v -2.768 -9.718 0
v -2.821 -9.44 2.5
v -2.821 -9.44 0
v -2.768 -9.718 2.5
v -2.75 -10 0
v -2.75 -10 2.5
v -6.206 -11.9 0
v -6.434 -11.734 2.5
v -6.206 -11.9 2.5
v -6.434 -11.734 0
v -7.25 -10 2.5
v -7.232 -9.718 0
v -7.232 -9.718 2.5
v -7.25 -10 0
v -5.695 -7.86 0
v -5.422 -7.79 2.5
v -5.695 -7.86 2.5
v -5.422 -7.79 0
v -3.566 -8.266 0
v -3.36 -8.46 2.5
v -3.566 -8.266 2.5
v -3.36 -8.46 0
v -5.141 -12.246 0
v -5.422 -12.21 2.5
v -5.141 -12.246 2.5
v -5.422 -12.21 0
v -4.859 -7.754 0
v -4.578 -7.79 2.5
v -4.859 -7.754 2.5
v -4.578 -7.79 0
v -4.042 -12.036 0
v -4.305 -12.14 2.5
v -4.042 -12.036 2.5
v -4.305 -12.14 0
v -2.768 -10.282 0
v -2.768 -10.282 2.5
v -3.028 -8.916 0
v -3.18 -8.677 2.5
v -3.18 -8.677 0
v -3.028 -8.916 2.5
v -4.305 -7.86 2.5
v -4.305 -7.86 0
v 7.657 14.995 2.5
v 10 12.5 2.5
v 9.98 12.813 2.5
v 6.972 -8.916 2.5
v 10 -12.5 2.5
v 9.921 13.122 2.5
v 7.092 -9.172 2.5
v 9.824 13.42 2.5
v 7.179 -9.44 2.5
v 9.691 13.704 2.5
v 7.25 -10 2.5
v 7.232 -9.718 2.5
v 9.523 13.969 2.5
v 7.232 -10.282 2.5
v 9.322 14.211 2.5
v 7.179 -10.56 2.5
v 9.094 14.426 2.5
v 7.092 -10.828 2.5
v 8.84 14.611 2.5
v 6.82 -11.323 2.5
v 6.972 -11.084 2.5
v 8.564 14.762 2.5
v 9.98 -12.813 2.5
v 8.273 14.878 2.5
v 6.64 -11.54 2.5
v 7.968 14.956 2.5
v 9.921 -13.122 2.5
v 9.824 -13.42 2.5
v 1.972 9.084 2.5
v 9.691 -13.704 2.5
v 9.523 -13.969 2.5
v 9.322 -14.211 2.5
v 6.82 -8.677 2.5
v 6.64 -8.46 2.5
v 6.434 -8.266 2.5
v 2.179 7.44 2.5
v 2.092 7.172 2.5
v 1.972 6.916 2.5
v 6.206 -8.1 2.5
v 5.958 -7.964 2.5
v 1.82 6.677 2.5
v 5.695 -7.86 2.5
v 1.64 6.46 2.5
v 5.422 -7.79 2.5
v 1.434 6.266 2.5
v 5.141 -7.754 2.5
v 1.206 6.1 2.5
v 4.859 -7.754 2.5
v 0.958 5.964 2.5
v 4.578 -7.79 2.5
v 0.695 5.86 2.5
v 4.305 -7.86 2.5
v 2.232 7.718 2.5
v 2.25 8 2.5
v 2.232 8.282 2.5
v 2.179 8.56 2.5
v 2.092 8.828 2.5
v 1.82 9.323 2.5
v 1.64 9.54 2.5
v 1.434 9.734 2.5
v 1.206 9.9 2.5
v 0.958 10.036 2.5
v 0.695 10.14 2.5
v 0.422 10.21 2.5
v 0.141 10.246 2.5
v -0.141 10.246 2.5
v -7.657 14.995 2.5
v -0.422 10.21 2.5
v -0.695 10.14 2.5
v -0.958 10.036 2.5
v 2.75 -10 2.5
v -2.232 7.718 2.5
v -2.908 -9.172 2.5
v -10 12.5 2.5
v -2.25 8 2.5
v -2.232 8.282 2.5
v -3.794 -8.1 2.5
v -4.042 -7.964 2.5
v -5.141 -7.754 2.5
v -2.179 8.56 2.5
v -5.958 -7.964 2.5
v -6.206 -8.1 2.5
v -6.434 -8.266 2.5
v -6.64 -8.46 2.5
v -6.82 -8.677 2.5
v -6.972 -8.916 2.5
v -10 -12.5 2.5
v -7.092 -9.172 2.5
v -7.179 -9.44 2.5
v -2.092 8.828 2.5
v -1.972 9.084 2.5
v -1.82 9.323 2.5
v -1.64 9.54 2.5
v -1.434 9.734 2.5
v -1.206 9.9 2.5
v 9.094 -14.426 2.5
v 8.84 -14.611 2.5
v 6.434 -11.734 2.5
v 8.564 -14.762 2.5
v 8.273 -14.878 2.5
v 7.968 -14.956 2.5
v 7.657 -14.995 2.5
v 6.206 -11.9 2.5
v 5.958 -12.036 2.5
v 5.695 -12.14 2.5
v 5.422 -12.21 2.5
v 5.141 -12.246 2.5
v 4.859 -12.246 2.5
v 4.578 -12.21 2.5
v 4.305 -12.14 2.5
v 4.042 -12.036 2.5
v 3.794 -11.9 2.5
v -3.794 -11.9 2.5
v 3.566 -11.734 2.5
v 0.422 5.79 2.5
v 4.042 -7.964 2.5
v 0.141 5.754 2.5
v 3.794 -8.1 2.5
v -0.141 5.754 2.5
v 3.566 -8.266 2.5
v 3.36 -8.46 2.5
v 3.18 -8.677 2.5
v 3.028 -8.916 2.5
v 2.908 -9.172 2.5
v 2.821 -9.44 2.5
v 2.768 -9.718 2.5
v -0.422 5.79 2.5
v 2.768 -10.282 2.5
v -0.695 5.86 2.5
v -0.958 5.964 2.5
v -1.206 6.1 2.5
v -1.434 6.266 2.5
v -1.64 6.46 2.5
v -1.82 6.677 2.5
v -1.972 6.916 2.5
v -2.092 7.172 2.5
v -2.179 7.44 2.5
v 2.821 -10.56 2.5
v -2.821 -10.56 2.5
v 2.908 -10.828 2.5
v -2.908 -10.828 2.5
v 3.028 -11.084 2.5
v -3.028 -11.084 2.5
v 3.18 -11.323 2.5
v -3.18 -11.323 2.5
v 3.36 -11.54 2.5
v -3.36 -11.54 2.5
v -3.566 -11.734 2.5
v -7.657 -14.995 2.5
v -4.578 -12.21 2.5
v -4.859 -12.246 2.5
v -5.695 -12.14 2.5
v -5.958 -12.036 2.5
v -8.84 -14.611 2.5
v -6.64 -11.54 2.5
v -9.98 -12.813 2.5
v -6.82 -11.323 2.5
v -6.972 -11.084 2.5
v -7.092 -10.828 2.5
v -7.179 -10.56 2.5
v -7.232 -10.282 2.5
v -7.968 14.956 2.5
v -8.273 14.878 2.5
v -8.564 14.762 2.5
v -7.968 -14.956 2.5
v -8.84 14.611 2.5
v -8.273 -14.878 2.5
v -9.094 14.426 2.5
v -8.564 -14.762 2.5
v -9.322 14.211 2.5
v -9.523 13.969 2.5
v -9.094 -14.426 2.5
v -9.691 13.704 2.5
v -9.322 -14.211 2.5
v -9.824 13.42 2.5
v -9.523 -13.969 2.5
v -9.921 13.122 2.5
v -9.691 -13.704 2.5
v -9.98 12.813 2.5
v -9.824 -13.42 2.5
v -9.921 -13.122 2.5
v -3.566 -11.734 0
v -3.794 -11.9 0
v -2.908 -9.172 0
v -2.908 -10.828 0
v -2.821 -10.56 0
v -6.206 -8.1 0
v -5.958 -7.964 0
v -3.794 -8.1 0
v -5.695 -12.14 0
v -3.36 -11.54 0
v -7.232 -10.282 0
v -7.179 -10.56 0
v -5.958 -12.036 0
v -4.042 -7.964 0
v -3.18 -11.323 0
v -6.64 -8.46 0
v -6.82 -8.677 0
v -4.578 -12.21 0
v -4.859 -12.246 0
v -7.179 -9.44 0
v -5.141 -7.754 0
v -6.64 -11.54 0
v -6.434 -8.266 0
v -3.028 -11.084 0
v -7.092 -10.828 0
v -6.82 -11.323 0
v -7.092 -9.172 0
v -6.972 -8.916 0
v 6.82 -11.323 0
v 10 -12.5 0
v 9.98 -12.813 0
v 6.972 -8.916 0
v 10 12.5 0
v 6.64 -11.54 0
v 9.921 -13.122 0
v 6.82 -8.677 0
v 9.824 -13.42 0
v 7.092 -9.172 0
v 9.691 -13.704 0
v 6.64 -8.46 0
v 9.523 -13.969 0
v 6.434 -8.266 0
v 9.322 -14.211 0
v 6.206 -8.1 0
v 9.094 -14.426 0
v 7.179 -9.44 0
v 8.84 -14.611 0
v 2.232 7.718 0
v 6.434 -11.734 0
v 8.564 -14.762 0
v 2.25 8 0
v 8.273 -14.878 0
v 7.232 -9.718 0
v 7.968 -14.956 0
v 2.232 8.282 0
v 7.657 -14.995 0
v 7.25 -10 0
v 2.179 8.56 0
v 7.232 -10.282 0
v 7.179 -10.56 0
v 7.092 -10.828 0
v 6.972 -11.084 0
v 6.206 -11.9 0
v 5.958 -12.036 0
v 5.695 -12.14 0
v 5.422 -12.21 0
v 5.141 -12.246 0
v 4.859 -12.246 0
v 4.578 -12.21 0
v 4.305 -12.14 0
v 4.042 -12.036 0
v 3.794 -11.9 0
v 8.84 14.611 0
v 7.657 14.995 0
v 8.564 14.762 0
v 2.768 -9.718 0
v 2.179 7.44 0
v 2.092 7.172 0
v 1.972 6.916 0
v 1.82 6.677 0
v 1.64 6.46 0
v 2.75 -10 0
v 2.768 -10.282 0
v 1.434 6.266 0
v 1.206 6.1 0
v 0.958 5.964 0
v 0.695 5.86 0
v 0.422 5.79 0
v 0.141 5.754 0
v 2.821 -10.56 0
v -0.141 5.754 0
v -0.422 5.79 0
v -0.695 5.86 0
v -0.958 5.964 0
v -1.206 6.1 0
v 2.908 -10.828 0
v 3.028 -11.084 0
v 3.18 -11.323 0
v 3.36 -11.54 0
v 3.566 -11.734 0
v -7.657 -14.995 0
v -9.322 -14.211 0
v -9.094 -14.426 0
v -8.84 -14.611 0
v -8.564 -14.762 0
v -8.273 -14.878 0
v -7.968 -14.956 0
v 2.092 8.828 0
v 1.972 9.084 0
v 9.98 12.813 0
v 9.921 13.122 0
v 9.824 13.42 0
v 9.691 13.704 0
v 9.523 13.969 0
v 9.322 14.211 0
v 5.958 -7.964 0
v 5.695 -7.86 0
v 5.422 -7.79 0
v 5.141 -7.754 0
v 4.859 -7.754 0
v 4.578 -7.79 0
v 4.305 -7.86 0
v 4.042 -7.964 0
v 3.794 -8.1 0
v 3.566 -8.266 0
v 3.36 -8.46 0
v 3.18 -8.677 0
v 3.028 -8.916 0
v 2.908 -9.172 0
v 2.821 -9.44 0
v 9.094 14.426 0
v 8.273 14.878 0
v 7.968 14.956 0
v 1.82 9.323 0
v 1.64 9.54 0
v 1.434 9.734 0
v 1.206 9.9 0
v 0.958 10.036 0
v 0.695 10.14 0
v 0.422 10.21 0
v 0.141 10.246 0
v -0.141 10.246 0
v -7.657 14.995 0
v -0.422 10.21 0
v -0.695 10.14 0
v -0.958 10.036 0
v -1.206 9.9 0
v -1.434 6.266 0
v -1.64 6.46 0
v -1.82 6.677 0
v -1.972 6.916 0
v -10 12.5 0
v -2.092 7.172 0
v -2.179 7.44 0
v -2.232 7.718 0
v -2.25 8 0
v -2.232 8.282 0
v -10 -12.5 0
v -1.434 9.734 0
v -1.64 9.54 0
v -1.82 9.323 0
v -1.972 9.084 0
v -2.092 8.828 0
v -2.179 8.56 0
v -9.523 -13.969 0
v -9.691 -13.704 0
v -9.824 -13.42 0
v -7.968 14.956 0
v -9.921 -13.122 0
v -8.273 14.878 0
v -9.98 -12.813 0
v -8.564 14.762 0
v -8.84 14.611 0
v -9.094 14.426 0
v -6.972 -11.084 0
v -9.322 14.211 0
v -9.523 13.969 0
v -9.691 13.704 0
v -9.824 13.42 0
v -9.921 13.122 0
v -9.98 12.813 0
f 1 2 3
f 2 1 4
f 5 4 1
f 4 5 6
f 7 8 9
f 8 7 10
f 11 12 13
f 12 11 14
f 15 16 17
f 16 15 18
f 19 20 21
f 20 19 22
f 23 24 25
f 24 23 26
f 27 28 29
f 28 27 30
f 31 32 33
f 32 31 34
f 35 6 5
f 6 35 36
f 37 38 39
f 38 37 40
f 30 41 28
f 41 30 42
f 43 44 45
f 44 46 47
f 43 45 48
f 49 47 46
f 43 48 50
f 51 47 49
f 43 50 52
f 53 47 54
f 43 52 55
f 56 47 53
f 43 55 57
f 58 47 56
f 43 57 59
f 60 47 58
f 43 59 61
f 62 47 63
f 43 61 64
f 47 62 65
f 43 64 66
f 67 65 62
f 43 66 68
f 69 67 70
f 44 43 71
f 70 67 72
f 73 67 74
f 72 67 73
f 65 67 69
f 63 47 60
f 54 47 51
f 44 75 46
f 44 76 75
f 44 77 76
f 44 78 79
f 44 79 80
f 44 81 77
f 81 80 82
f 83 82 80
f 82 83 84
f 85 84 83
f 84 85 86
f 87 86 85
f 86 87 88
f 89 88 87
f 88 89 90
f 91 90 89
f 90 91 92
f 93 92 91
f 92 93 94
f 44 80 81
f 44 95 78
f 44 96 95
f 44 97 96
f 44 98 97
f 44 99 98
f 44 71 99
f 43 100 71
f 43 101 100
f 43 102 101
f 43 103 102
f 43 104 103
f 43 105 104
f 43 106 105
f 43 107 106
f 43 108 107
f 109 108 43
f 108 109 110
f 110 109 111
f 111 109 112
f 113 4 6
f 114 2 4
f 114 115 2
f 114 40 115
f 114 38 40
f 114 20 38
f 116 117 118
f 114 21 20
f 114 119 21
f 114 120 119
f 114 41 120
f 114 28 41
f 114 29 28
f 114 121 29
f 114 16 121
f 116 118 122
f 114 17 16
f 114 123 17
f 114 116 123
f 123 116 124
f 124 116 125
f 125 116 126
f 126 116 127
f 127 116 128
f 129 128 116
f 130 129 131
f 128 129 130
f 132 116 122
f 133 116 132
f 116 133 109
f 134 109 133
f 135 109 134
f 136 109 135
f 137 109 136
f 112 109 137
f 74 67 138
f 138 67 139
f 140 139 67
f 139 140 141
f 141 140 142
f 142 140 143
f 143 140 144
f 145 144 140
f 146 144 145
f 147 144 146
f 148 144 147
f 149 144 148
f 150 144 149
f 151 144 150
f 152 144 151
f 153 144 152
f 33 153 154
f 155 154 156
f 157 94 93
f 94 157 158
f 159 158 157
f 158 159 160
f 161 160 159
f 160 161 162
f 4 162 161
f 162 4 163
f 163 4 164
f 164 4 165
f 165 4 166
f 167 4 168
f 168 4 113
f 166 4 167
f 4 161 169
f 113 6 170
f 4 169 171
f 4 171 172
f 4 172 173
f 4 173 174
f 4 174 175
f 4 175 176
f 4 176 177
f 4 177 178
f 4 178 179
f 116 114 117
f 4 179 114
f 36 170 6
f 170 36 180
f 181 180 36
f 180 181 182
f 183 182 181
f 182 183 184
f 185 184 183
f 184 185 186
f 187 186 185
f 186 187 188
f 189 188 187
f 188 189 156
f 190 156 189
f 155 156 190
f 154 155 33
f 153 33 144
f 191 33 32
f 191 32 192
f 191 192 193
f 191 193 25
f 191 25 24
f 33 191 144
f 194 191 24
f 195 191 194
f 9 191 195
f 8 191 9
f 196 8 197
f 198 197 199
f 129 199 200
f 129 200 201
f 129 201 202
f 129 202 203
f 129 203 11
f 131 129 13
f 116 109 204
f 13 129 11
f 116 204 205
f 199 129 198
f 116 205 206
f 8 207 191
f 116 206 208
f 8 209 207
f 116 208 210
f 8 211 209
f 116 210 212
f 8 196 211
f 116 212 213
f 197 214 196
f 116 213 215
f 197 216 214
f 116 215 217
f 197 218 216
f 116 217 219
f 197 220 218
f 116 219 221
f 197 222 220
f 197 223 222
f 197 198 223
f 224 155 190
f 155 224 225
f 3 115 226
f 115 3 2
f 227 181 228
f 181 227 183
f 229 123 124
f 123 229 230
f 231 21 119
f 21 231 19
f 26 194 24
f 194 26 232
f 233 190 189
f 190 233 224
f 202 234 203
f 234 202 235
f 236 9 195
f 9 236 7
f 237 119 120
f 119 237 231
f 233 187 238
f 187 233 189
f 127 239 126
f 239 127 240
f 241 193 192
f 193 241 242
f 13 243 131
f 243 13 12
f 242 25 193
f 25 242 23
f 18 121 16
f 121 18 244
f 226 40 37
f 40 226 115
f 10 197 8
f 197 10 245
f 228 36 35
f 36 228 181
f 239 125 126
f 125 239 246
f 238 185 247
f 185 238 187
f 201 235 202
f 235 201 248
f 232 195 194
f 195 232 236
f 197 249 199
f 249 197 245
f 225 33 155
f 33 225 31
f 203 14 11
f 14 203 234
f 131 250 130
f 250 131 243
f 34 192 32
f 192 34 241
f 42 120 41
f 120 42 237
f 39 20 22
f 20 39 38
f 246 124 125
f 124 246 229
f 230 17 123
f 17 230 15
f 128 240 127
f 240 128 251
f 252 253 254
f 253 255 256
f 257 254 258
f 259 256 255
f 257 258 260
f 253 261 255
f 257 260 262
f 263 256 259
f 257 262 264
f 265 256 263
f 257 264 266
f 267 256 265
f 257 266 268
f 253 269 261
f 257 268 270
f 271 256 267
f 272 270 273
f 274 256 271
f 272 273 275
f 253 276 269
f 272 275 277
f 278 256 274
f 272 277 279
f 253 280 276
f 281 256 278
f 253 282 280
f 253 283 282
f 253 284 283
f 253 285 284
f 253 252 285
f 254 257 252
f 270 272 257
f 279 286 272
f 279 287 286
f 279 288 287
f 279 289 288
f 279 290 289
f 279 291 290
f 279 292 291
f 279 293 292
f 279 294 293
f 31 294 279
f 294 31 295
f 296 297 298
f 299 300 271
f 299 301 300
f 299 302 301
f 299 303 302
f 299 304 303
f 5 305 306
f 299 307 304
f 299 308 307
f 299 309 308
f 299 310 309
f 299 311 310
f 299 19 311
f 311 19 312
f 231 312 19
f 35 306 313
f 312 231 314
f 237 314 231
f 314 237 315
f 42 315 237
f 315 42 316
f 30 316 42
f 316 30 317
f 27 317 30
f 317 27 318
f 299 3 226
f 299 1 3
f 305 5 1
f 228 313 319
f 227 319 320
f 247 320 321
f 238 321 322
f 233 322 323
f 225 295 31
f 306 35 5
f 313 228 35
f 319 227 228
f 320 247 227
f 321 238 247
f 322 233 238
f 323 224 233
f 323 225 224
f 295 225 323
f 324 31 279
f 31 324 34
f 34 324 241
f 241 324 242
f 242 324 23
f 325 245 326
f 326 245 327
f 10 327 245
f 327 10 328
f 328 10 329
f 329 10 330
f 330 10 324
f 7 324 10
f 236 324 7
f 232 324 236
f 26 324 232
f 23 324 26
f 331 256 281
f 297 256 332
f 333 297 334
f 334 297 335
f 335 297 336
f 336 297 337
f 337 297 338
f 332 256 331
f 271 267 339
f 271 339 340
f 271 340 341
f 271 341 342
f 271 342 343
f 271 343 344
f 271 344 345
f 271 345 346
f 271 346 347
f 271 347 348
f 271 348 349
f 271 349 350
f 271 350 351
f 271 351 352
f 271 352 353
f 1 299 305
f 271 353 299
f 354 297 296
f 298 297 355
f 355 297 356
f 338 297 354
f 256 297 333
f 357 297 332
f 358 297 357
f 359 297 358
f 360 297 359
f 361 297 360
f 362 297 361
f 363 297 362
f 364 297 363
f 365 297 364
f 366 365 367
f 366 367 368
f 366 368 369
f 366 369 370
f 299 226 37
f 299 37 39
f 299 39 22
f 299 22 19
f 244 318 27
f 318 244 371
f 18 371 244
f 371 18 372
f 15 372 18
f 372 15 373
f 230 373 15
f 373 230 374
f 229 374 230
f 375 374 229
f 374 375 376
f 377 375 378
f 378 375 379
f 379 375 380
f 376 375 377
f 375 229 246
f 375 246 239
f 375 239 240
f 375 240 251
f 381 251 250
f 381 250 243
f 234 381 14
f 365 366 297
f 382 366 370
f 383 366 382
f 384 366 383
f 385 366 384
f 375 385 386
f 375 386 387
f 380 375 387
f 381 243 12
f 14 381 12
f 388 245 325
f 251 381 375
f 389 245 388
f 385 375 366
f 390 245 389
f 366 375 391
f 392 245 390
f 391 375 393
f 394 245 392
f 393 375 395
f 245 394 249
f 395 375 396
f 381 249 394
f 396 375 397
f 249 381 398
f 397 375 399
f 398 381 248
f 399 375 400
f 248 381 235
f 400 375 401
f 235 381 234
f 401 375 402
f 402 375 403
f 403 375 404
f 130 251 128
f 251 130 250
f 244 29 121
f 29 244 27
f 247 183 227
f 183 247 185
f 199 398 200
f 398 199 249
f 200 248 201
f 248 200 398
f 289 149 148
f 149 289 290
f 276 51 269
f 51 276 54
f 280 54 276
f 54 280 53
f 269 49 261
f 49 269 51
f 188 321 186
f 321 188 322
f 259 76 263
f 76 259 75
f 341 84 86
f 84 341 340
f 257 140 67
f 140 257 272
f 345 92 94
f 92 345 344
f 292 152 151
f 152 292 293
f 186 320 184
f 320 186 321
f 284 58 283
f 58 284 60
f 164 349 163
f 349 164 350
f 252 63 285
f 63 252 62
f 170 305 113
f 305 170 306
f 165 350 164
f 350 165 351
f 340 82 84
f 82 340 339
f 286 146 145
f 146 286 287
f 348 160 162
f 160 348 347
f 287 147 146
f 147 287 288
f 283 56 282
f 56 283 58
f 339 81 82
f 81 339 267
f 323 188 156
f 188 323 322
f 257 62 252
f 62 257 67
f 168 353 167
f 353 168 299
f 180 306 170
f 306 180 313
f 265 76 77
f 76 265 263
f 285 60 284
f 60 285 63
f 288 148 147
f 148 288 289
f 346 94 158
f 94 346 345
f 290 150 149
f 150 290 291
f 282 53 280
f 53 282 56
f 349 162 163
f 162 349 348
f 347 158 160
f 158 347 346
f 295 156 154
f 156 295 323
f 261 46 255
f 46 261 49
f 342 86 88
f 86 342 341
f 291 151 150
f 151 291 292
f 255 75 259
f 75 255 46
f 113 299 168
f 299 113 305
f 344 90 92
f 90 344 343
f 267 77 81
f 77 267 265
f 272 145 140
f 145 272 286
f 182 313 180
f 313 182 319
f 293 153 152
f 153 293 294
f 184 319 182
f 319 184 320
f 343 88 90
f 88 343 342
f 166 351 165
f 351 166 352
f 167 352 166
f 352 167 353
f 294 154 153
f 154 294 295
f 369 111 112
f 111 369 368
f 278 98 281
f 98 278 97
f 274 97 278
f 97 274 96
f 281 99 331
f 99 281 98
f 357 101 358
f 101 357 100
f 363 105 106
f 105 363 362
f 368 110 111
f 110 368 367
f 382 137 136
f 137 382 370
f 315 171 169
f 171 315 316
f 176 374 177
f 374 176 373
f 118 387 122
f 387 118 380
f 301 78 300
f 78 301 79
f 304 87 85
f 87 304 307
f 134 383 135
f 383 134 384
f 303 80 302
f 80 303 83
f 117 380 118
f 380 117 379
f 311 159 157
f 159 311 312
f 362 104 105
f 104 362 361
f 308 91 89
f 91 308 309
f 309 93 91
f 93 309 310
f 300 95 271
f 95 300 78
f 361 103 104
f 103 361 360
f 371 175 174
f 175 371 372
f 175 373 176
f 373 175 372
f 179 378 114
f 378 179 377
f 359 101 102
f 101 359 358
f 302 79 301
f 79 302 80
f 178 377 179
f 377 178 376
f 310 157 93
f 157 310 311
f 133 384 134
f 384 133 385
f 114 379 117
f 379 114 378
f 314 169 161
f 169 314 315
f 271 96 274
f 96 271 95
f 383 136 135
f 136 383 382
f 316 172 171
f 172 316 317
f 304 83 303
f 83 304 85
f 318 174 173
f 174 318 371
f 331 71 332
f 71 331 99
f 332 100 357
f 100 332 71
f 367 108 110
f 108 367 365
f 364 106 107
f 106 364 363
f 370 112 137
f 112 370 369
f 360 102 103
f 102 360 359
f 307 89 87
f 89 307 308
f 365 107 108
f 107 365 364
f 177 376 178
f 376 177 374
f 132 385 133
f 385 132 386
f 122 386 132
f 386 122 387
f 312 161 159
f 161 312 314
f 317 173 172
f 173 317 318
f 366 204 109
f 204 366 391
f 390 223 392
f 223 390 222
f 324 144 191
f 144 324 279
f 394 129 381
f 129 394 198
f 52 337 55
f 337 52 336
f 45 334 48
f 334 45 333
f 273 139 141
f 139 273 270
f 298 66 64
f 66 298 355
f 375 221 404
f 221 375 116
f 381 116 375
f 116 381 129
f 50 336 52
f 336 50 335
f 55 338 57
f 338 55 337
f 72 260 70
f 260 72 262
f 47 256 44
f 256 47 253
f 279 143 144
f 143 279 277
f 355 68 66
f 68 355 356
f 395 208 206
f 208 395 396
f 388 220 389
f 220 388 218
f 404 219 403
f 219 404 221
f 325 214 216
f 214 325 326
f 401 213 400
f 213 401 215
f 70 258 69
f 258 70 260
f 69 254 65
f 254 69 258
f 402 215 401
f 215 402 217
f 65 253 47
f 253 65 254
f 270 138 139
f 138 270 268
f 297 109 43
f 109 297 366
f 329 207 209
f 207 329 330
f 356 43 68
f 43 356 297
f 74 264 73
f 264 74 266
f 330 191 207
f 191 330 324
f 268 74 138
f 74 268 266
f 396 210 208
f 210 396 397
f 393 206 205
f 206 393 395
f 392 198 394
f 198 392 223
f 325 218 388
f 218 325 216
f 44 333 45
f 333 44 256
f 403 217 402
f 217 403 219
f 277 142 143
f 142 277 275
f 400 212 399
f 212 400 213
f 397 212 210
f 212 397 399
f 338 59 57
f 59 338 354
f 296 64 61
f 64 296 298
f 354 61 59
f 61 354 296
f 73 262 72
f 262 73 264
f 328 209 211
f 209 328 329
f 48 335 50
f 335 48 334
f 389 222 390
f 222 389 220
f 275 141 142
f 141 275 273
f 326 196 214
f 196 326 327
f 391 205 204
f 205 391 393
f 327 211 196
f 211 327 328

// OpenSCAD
WIDTH = 20;
LENGTH = 30;
THICKNESS = 2.5;
CORNER_DIA = 5;

HOLE_DIA = 4.5;
HOLE_OFFSETS= [
  [-5, -10], [5, -10],
  [0, 8], [0, 8]
];

$fn = 50;

module rounded_rect(width, length, height, corner_dia) {
  hull() {
    for (i = [-1, 1]) {
      for (j = [-1, 1]) {
        translate([i*(width-corner_dia)/2, j*(length-corner_dia)/2, 0])
        cylinder(d = corner_dia, h = height);
      }
    }
  }
}

difference() {
  rounded_rect(WIDTH, LENGTH, THICKNESS, CORNER_DIA);

  #for(o = HOLE_OFFSETS) {
    translate([o[0], o[1], 0])
    cylinder(d = HOLE_DIA, h = THICKNESS);
  }
}
